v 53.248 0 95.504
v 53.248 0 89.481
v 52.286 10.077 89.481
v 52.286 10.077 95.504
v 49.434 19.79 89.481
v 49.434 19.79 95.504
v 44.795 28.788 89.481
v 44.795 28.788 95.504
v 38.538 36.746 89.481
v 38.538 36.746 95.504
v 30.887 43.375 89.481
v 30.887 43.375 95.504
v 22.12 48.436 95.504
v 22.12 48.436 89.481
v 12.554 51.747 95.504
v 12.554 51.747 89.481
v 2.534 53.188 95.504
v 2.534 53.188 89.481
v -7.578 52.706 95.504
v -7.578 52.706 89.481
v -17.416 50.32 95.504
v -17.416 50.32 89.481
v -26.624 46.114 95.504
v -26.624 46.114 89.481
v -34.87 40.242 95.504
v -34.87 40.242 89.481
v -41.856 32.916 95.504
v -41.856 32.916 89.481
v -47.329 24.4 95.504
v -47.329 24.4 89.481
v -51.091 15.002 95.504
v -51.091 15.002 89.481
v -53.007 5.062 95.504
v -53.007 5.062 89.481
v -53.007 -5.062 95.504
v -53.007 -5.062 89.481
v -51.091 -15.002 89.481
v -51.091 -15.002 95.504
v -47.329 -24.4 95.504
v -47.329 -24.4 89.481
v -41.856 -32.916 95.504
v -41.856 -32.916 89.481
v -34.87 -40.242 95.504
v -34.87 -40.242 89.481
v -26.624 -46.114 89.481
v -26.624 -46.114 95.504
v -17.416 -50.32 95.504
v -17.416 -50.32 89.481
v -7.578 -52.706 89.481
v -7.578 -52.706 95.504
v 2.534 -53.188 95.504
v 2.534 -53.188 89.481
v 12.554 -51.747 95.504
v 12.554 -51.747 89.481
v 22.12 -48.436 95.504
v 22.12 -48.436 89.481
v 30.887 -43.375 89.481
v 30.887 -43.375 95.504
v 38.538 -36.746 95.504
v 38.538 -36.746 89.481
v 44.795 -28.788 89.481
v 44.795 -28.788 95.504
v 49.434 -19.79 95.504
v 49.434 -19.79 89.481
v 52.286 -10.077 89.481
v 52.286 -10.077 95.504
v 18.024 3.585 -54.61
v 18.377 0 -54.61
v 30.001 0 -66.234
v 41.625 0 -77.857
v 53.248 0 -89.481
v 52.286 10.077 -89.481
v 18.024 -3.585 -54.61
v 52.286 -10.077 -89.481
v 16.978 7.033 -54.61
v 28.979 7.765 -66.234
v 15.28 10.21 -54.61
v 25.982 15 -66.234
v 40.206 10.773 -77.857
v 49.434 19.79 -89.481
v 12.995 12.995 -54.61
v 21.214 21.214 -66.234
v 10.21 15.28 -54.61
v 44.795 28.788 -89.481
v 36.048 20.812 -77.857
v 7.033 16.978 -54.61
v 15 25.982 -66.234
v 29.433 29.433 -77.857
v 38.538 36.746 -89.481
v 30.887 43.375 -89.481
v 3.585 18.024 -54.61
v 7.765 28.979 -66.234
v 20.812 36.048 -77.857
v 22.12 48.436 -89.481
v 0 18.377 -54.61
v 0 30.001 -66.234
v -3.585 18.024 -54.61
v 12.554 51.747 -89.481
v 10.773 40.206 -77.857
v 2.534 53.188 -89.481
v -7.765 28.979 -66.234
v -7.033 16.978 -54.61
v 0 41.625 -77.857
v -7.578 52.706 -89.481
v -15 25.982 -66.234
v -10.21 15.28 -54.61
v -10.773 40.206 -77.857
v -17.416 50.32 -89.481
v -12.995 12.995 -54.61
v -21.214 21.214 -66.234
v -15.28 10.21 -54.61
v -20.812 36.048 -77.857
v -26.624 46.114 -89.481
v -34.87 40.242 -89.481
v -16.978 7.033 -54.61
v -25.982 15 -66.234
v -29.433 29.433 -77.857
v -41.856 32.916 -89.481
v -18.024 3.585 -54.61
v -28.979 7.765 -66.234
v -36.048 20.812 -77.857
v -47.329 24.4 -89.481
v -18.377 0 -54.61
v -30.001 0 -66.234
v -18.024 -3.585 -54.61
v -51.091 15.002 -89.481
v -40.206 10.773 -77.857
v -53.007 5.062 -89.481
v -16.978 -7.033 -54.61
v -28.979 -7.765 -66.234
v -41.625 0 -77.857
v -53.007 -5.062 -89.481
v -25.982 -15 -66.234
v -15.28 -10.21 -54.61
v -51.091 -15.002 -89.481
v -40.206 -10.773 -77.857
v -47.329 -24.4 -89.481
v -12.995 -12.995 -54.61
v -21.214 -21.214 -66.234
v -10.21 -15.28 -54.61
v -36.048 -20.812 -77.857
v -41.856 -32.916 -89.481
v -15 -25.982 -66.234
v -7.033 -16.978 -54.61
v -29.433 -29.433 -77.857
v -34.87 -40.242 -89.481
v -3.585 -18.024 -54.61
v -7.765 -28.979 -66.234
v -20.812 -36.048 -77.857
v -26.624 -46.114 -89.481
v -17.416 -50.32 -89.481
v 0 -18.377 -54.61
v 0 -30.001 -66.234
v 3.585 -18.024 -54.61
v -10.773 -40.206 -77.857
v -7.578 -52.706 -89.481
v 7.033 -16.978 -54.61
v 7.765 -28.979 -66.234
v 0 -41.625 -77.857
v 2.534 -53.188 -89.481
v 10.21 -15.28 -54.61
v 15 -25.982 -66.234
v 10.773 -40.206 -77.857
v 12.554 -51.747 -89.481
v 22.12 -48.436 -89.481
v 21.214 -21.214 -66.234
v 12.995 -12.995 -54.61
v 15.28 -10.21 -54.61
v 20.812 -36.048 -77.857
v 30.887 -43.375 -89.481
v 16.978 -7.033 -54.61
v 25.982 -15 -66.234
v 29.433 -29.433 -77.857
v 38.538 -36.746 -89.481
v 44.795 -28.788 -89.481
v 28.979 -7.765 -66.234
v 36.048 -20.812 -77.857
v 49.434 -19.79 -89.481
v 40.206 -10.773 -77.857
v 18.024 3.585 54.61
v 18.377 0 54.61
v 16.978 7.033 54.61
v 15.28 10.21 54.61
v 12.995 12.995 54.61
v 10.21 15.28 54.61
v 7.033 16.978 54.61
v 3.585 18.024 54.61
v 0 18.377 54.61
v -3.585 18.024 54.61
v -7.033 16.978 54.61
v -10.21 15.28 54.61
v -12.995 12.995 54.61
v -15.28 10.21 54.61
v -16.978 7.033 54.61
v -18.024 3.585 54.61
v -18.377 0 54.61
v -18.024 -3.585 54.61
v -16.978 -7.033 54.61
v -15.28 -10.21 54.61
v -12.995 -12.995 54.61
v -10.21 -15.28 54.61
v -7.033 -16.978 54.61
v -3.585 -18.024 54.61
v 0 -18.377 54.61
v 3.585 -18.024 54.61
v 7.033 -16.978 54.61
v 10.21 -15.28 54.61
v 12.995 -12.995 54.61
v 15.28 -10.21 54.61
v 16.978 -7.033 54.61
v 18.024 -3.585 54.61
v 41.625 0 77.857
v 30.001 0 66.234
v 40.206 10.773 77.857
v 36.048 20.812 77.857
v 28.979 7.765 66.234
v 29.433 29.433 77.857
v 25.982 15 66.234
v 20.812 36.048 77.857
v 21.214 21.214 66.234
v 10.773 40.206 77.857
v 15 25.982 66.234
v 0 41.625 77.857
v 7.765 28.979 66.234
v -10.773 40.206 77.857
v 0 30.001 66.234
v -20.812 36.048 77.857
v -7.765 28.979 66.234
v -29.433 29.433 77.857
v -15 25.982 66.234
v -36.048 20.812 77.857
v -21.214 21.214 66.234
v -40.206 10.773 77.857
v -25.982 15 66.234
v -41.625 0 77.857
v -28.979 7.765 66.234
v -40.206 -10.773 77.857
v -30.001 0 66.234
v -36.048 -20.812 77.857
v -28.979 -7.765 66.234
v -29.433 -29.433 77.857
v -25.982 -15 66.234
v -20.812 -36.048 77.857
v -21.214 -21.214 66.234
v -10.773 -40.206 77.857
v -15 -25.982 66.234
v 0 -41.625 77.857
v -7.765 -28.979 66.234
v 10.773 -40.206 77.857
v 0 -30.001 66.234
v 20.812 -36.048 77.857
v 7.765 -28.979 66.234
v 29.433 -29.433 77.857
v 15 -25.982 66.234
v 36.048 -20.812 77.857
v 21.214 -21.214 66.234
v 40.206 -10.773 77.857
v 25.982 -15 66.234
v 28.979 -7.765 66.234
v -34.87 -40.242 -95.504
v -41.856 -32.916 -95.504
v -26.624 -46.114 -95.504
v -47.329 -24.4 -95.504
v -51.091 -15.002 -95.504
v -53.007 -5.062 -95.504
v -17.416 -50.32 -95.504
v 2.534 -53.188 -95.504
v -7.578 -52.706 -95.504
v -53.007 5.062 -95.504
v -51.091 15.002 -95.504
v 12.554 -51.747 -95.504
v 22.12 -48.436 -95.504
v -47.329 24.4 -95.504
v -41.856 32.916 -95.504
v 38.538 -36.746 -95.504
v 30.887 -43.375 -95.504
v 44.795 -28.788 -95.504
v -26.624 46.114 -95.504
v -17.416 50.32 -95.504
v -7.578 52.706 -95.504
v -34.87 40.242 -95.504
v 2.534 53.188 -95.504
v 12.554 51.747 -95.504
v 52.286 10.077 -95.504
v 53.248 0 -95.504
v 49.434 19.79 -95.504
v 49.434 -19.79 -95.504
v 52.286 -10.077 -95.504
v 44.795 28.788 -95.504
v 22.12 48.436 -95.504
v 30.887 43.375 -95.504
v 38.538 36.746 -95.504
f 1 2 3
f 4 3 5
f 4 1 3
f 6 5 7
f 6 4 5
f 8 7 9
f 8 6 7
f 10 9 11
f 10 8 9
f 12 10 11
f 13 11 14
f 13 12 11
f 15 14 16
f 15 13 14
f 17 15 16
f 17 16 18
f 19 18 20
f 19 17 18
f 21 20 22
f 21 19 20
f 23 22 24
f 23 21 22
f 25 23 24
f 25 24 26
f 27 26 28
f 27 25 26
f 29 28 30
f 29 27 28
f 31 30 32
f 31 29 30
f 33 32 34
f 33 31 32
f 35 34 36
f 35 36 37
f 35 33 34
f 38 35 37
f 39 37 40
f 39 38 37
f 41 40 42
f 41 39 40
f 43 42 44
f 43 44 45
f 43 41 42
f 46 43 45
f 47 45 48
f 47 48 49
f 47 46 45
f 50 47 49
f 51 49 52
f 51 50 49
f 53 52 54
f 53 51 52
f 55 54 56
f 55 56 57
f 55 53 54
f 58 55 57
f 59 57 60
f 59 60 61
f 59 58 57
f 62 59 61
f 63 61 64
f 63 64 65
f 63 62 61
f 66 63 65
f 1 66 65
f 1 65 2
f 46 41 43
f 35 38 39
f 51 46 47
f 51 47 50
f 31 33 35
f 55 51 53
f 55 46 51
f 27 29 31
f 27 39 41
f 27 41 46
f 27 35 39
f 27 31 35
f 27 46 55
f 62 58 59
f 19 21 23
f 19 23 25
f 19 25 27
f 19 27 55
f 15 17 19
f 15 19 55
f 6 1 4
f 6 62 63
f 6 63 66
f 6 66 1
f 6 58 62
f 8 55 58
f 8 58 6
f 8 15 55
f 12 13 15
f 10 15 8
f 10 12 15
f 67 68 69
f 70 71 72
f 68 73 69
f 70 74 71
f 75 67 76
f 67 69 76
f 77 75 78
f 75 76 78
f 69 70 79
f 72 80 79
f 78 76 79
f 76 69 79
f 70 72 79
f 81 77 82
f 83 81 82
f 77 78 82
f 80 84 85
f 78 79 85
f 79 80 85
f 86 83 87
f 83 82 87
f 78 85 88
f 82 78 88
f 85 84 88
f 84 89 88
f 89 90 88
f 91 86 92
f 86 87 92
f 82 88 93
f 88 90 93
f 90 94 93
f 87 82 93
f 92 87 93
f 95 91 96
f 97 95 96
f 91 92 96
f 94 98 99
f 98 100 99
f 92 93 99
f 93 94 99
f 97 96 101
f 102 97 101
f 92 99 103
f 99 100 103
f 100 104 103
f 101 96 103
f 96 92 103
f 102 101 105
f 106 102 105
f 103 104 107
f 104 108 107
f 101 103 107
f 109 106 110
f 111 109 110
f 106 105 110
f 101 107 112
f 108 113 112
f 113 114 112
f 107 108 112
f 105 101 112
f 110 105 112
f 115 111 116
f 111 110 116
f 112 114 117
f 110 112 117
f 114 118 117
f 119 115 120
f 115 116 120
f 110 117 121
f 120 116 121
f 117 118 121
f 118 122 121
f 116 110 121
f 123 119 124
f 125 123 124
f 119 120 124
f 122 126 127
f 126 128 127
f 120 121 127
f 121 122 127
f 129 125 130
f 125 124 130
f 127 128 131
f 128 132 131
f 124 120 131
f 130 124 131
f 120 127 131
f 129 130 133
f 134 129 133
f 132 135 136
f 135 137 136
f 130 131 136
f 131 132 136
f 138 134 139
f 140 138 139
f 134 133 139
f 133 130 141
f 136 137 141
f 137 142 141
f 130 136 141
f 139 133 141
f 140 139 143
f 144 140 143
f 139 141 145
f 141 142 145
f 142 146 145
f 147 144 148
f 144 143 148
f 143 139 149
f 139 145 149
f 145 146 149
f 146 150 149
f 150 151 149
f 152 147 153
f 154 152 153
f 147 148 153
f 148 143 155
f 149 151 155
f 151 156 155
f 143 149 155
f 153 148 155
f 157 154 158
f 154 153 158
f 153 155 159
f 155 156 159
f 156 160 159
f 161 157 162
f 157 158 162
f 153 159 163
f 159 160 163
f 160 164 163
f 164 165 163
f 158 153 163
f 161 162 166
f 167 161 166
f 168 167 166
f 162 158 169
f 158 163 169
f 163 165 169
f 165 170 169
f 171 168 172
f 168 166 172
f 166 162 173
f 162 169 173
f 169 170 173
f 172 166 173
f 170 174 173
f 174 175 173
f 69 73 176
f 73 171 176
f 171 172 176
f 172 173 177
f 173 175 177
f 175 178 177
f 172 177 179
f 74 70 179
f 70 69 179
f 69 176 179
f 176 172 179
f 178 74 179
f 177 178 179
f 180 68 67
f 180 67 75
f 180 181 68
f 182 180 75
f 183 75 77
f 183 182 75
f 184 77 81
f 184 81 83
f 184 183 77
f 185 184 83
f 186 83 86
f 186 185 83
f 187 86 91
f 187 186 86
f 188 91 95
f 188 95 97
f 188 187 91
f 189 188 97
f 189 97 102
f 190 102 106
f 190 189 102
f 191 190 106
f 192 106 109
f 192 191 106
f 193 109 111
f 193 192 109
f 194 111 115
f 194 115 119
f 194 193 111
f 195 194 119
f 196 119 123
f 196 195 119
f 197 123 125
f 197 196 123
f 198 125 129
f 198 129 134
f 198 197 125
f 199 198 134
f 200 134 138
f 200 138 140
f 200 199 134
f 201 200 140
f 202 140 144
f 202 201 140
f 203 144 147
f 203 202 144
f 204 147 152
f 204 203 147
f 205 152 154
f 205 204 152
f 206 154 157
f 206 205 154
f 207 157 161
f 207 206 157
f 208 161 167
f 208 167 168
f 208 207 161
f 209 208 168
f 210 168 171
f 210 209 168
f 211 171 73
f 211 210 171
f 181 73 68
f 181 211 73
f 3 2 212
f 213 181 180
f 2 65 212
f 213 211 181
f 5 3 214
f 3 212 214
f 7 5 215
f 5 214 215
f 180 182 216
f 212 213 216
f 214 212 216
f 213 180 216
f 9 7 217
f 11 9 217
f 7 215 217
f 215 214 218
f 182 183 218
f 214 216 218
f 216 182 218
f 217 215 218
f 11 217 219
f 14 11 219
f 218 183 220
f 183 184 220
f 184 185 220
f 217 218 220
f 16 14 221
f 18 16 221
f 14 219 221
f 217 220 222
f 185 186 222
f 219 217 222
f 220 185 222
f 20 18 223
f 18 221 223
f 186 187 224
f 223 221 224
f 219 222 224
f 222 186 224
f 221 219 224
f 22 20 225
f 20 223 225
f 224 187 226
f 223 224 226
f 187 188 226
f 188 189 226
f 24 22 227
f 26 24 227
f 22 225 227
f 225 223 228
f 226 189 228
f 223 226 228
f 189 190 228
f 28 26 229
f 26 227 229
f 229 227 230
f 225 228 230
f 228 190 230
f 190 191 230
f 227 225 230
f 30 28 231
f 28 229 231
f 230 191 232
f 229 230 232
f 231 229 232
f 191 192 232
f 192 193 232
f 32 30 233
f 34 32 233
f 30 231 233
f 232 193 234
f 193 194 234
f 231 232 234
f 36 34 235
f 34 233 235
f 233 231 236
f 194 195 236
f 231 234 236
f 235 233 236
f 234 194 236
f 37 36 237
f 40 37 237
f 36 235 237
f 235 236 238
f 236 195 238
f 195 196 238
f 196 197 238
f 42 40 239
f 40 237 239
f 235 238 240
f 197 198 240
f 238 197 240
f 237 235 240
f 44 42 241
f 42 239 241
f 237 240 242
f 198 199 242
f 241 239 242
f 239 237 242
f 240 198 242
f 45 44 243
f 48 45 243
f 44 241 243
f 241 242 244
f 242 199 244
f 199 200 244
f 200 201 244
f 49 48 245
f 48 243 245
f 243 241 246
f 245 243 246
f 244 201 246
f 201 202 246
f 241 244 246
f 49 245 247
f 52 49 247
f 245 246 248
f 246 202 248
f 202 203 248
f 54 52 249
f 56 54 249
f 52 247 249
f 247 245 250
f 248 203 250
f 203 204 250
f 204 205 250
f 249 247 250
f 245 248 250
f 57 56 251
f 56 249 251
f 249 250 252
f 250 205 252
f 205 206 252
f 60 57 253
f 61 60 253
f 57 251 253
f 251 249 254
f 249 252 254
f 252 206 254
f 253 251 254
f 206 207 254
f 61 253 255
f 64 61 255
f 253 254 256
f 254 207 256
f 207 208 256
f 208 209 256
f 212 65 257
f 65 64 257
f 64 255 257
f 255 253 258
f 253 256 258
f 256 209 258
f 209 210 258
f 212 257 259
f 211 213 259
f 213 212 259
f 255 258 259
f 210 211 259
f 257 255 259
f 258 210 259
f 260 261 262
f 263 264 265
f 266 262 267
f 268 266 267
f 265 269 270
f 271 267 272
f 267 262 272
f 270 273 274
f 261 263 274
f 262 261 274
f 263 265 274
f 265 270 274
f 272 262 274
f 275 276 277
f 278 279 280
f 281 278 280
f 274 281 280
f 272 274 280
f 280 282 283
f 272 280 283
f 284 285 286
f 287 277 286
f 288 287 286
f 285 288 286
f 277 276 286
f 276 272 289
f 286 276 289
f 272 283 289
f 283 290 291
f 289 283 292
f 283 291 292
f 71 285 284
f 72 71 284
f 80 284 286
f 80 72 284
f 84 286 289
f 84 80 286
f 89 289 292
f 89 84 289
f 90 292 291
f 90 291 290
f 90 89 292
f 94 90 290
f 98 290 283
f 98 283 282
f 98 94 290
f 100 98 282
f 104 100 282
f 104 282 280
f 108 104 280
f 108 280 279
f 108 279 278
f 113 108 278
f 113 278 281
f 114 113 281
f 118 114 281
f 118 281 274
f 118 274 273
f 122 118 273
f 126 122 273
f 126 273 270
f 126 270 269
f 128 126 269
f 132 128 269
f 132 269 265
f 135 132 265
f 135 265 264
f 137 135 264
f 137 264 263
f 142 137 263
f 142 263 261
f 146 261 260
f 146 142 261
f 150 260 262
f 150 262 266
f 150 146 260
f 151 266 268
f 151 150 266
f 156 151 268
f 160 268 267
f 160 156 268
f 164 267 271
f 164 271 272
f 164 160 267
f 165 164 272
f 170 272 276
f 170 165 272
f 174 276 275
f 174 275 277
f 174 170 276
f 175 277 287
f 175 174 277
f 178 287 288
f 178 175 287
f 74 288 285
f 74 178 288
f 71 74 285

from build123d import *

# Parameters (mm, degrees)
F0_R         = 18.3771927797
F1_DEPTH     = 89.916
F2_R         = 53.2482574965
F2_R_2       = 18.3771927797
F3_DEPTH     = 5.588
F5_S5_R      = 53.2482574965
F5_T6_DEPTH  = 79
F5_S11_R     = 53.2482574965
F5_T12_DEPTH = 79


# Not quite as in the source:
# - a fillet or chamfer that OpenCascade refuses, or shapes differently, is made with other operations: its cross-section is extruded or revolved along the edge and cut away or added


with BuildPart() as f1:
    # F0 (on Top) → F1 (new body)
    with BuildSketch(Plane.XY):
        Circle(F0_R)
    extrude(amount=F1_DEPTH)

    # F2 (on face) → F3 (join)
    with BuildSketch(Plane.XY.offset(89.916)):
        Circle(F2_R)
        Circle(F2_R_2, mode=Mode.SUBTRACT)
        Circle(F2_R_2)
    extrude(amount=F3_DEPTH)

    # F4: F1 across plane


with BuildPart() as f1_1:
    add(f1.part)
    add(f1.part.mirror(Plane.XY))

    # F5: chamfer of 35.306 on 5 edges, made by hand


with BuildPart() as f5_tool2:
    # F5_s3 → F5_t4 (revolve)
    with BuildSketch(Plane.XZ):
        Polygon((53.6831927797, 89.916), (18.3771927797, 54.61), (18.3771927797, 89.916), align=None)
    revolve(axis=Axis((0, 0, 89.916), (0, 0, 1)))

    # F5_s5 → F5_t6 (intersect, symmetric)
    with BuildSketch(Plane.XY.offset(72.3)):
        Circle(F5_S5_R)
    extrude(amount=F5_T6_DEPTH, both=True, mode=Mode.INTERSECT)


with BuildPart() as f1_2:
    add(f1_1.part)

    # F5_t1: union F5_tool2
    add(f5_tool2.part)


with BuildPart() as f5_tool8:
    # F5_s9 → F5_t10 (revolve)
    with BuildSketch(Plane.XZ):
        Polygon((18.3771927797, -54.61), (53.6831927797, -89.916), (18.3771927797, -89.916), align=None)
    revolve(axis=Axis((0, 0, -89.916), (0, 0, 1)))

    # F5_s11 → F5_t12 (intersect, symmetric)
    with BuildSketch(Plane.XY.offset(-72.3)):
        Circle(F5_S11_R)
    extrude(amount=F5_T12_DEPTH, both=True, mode=Mode.INTERSECT)


with BuildPart() as f1_3:
    add(f1_2.part)

    # F5_t7: union F5_tool8
    add(f5_tool8.part)


solid = f1_3.part
